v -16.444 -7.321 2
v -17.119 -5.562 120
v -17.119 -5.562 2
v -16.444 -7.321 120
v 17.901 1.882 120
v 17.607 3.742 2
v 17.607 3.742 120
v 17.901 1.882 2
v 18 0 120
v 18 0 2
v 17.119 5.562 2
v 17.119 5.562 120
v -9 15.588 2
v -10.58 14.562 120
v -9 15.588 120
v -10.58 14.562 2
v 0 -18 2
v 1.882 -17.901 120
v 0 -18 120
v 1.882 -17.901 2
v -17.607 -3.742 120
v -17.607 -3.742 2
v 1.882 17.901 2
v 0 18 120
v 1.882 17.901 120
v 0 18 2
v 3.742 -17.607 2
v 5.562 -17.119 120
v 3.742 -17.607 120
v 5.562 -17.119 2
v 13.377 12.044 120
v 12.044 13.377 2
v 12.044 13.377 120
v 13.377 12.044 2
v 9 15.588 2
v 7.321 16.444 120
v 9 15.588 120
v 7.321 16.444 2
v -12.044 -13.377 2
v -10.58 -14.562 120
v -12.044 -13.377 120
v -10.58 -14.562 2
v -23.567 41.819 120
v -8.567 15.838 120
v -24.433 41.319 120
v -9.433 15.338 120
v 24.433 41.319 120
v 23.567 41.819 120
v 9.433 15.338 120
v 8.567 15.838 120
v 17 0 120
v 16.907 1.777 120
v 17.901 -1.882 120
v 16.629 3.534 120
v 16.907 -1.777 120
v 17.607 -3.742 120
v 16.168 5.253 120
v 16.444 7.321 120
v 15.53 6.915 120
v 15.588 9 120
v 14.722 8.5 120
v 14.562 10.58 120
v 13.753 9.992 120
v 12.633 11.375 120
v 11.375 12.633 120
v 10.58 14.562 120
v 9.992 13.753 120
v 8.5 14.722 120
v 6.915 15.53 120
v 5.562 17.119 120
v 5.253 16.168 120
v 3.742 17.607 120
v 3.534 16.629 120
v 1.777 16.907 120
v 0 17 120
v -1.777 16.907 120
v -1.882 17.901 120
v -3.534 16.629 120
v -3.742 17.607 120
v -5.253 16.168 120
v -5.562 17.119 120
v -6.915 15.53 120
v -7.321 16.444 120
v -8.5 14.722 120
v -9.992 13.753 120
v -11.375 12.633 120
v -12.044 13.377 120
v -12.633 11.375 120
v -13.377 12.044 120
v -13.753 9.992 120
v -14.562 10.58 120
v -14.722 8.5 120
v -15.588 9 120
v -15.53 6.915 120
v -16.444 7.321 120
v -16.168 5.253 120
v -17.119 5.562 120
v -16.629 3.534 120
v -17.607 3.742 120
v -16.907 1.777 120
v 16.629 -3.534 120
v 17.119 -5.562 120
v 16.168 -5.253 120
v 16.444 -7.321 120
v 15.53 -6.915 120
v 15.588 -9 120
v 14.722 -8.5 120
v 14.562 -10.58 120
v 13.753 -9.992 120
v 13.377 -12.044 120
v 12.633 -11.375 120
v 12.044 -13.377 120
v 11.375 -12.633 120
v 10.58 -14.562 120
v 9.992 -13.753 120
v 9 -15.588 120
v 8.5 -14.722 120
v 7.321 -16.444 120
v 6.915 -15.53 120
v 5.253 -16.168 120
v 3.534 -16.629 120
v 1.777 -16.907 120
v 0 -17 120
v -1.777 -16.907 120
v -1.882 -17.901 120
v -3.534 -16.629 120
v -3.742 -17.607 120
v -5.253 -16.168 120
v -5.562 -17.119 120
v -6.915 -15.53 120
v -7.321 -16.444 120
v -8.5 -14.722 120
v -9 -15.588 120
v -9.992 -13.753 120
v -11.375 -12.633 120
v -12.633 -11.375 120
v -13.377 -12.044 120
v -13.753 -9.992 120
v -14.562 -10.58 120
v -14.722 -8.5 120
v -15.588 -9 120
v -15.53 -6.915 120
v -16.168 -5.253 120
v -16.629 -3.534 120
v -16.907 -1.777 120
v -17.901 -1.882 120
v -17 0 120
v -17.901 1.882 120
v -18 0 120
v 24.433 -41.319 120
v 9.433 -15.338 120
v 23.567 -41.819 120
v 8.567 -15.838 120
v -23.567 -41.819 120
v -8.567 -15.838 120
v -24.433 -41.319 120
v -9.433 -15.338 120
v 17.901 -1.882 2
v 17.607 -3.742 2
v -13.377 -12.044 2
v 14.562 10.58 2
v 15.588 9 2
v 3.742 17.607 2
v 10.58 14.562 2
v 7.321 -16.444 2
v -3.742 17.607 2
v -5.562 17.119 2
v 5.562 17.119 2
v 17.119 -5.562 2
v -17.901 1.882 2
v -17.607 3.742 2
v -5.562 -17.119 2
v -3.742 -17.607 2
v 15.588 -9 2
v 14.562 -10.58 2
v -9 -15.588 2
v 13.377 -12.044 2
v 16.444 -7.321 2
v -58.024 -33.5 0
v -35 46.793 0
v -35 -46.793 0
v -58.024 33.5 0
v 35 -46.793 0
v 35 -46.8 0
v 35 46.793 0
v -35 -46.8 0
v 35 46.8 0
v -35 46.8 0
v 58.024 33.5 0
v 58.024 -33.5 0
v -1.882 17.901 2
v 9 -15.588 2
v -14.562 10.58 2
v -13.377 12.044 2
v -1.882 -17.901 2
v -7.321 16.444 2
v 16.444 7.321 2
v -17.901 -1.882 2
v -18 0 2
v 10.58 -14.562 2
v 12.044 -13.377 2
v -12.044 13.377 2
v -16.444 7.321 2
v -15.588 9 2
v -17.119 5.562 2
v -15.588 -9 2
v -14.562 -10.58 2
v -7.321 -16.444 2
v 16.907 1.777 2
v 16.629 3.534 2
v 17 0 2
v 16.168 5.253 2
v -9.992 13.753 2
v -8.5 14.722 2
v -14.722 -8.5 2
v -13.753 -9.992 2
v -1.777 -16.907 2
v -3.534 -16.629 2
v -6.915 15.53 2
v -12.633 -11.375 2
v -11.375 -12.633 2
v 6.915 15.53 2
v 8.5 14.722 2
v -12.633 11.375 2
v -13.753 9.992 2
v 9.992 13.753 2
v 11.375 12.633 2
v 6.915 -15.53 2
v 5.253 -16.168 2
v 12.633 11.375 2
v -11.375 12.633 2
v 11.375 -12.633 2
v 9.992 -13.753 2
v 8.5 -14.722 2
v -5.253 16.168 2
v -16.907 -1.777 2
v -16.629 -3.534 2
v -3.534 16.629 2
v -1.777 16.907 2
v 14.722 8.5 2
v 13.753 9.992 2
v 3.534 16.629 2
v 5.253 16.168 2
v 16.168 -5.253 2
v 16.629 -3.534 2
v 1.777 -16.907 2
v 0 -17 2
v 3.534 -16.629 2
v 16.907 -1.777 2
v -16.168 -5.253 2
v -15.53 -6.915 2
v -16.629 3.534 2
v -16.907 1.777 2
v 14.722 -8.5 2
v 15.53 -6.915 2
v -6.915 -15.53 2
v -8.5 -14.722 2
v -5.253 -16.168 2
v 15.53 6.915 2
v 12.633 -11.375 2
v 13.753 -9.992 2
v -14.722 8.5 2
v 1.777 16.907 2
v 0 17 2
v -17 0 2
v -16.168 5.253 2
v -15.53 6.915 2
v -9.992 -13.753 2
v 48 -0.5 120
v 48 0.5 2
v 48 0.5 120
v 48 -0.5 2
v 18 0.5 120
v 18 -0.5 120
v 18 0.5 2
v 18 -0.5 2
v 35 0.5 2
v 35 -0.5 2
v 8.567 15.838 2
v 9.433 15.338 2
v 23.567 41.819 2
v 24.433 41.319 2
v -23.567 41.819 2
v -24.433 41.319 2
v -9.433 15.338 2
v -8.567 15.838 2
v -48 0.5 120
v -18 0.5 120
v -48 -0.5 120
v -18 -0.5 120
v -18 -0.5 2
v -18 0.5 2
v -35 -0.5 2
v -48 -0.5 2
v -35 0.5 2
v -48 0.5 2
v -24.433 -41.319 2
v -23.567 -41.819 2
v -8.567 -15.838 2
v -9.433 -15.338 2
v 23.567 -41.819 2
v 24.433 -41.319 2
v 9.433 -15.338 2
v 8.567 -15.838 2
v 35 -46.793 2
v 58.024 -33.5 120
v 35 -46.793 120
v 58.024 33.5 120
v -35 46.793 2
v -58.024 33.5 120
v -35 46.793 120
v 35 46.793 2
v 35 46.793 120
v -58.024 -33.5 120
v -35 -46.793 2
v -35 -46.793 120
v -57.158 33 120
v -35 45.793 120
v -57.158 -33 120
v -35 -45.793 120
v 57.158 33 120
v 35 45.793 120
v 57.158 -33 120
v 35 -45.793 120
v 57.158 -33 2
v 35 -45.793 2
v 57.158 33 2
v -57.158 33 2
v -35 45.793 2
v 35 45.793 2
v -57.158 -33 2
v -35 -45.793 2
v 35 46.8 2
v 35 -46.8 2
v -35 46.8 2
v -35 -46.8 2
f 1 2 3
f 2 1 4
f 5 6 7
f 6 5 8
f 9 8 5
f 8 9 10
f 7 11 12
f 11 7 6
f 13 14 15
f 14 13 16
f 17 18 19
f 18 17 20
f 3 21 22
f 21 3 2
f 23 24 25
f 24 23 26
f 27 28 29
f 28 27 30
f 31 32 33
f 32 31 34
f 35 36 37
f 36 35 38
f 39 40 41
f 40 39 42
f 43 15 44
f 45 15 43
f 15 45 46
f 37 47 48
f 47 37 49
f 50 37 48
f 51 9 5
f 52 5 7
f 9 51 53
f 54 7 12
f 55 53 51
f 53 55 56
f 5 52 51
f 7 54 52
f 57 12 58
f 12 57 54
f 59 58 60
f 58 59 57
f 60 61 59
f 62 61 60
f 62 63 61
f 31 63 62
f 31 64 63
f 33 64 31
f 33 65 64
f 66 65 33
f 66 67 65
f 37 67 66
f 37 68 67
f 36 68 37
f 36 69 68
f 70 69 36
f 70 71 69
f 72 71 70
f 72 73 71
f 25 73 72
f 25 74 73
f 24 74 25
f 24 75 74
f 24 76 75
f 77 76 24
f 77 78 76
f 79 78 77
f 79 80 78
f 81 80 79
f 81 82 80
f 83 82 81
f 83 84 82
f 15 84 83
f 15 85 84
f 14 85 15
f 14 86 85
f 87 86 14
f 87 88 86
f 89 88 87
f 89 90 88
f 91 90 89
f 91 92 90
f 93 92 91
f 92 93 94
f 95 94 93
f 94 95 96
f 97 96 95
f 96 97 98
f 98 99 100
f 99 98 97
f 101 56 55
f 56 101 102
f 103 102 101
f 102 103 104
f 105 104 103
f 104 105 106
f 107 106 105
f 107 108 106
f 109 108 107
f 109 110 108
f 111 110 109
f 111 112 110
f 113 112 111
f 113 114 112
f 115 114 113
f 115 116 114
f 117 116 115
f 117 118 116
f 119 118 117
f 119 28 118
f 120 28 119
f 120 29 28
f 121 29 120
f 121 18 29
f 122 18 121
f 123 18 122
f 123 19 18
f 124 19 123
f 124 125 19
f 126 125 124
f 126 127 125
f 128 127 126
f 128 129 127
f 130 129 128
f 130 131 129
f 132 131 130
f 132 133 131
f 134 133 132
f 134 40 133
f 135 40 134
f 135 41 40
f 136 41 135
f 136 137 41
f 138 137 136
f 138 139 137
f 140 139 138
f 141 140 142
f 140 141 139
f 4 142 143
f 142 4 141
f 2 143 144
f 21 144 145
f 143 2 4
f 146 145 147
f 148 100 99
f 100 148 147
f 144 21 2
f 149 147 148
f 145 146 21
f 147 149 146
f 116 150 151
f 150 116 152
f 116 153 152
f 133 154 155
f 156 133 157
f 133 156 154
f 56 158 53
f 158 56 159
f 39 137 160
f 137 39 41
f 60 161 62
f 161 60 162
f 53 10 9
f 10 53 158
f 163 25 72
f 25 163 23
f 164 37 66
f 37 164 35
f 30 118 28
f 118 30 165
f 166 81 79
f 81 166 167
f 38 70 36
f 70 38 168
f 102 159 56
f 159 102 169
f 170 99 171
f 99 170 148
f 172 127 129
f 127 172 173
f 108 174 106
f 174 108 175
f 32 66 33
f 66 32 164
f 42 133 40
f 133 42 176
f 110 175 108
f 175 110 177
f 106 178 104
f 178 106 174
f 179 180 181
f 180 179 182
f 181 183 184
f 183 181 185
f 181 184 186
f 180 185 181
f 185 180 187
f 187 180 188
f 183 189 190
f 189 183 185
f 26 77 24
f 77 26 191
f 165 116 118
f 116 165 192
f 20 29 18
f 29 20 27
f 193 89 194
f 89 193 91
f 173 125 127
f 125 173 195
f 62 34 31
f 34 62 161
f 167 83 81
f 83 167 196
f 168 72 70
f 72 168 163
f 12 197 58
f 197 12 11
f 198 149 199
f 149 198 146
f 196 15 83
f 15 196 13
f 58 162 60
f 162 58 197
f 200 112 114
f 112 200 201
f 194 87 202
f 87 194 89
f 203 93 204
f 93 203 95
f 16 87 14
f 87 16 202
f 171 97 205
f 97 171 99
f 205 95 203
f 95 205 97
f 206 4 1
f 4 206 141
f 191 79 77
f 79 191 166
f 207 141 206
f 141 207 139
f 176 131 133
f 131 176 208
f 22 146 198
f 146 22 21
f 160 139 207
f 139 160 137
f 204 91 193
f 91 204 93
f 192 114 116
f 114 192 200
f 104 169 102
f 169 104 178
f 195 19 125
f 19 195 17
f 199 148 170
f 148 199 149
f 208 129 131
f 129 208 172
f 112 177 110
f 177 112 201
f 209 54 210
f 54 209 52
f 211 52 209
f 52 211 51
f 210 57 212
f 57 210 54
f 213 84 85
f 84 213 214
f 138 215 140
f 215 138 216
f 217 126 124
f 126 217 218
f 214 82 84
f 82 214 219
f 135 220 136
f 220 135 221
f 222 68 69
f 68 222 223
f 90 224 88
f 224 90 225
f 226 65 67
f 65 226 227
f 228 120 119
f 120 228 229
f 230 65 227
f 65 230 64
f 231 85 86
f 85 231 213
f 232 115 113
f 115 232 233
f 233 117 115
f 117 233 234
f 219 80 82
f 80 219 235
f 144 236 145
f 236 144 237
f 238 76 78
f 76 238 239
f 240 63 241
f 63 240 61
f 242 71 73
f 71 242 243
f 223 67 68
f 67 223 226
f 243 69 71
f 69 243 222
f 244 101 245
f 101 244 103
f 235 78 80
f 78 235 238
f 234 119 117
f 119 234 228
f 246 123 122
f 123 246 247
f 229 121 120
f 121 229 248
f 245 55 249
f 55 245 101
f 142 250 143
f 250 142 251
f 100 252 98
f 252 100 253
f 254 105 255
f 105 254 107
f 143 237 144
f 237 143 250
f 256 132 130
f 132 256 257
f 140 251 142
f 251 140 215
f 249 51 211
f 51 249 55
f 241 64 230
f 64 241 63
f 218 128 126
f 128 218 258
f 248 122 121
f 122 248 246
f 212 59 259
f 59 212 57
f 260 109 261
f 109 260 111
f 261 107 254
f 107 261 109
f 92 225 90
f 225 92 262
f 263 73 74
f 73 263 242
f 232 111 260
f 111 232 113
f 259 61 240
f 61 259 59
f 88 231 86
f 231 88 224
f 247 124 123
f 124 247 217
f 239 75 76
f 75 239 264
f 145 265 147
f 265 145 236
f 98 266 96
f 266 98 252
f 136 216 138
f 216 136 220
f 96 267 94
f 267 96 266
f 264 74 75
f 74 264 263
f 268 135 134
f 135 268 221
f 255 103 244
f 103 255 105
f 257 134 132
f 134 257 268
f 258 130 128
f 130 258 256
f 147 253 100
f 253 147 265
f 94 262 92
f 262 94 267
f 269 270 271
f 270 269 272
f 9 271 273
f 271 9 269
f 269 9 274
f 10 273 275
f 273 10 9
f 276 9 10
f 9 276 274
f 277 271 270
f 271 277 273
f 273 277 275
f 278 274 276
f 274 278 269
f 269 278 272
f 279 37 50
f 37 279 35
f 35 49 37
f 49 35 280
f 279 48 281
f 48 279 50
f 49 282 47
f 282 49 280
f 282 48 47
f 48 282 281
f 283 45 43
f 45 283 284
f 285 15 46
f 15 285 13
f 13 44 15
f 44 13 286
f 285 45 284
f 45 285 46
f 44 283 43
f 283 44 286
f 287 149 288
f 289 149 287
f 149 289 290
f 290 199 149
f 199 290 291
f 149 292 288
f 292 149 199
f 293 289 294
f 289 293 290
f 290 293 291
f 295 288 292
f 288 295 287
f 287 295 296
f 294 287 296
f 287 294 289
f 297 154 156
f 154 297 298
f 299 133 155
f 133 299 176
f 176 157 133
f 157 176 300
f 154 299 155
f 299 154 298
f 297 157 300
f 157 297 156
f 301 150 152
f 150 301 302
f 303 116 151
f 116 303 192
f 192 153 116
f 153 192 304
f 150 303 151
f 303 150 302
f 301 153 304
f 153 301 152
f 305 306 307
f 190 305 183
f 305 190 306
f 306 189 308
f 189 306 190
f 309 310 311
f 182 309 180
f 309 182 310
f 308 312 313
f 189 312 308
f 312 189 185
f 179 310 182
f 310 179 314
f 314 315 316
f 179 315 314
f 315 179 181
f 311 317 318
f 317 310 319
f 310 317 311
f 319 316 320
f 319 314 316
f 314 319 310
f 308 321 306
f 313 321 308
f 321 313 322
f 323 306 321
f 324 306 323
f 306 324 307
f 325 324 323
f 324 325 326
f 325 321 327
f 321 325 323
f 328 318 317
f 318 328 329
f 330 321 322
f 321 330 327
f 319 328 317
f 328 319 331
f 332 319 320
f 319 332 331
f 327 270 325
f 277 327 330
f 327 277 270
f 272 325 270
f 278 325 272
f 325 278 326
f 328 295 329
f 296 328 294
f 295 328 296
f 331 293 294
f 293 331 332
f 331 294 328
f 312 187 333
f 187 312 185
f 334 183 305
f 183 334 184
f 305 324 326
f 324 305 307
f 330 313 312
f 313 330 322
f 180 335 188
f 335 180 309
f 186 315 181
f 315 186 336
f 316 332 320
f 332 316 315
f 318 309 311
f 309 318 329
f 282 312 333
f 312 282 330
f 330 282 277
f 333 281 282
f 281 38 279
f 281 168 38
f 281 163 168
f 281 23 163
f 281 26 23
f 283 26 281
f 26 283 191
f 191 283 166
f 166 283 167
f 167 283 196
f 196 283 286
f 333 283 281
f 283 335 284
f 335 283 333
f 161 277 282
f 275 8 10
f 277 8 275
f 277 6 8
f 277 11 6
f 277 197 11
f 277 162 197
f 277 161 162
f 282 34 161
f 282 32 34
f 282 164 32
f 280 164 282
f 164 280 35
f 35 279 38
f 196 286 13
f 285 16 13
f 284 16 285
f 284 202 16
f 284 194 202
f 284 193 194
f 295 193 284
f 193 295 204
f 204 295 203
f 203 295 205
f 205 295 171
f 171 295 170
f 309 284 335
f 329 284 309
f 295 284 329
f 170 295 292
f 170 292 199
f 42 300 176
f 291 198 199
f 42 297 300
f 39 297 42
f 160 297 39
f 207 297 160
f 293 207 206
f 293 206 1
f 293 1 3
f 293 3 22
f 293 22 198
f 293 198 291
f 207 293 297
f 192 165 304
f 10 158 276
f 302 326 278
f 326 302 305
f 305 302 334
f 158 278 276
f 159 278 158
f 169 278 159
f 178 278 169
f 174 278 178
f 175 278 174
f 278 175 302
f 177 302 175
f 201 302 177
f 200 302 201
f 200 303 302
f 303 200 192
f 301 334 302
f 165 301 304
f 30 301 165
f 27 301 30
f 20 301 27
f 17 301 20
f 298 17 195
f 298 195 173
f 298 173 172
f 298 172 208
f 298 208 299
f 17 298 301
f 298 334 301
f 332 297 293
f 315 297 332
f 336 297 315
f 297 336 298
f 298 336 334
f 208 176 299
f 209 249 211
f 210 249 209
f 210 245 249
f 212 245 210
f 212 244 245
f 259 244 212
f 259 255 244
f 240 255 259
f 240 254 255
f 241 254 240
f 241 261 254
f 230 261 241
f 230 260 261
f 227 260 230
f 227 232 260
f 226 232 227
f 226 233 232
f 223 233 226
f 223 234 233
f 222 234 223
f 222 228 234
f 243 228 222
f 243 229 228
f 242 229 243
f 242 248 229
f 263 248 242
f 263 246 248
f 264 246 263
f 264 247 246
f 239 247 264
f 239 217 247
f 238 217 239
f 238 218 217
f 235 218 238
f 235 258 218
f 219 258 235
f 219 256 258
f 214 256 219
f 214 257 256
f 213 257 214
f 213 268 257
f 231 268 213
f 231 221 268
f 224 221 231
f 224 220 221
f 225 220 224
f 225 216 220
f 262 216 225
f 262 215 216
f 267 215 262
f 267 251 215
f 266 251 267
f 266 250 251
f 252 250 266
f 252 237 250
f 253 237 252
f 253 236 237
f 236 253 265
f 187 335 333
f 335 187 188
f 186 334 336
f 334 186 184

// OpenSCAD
scale([2,2,2])
{
$fn=60;

difference(){
    cylinder(d=18,h=60);
    translate([0,0,-1])cylinder(d=17,h=62);
}

for (j=[0:60:300]){
    rotate([0,0,j])
    translate([9,-.25,0])
    cube([15,.5,60]);
}

difference(){
    rotate([0,0,30])
    cylinder(d=67,h=60,$fn=6);
    rotate([0,0,30])translate([0,0,1])
    cylinder(d=66,h=65,$fn=6);
    translate([0,0,25])cube([35,70,72],center=true);
}

translate([0,0,0.5])
cube([35,46.8,1],center=true);
}
